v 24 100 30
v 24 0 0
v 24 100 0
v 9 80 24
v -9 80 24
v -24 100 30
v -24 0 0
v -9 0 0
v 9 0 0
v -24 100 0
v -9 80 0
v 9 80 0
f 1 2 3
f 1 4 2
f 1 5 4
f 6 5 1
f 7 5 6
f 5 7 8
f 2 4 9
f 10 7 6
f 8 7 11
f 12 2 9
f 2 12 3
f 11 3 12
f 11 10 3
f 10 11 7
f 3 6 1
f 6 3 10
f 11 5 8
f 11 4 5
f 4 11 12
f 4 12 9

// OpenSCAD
slitWidth = 18;
slitLength = 80;
taperWidth = 15;
length = 100;
height = 30;

puller();

module puller()
{
    difference()
    {
        base();
        translate([-slitWidth / 2, -0.1, -0.1])
        {
            linear_extrude(height = height + 0.2)
            {
                square([slitWidth, slitLength + 0.1]);
            }
        }
    }
}

module base()
{
    width = slitWidth + 2 * taperWidth;
    translate([width / 2, 0, 0])
    {
        rotate([0, -90, 0])
        {
            linear_extrude(height = width)
            {
                polygon(    points  =   [
                                            [0, 0],
                                            [0, length],
                                            [height, length],
                                        ]
                        );
            }
        }
    }
}
